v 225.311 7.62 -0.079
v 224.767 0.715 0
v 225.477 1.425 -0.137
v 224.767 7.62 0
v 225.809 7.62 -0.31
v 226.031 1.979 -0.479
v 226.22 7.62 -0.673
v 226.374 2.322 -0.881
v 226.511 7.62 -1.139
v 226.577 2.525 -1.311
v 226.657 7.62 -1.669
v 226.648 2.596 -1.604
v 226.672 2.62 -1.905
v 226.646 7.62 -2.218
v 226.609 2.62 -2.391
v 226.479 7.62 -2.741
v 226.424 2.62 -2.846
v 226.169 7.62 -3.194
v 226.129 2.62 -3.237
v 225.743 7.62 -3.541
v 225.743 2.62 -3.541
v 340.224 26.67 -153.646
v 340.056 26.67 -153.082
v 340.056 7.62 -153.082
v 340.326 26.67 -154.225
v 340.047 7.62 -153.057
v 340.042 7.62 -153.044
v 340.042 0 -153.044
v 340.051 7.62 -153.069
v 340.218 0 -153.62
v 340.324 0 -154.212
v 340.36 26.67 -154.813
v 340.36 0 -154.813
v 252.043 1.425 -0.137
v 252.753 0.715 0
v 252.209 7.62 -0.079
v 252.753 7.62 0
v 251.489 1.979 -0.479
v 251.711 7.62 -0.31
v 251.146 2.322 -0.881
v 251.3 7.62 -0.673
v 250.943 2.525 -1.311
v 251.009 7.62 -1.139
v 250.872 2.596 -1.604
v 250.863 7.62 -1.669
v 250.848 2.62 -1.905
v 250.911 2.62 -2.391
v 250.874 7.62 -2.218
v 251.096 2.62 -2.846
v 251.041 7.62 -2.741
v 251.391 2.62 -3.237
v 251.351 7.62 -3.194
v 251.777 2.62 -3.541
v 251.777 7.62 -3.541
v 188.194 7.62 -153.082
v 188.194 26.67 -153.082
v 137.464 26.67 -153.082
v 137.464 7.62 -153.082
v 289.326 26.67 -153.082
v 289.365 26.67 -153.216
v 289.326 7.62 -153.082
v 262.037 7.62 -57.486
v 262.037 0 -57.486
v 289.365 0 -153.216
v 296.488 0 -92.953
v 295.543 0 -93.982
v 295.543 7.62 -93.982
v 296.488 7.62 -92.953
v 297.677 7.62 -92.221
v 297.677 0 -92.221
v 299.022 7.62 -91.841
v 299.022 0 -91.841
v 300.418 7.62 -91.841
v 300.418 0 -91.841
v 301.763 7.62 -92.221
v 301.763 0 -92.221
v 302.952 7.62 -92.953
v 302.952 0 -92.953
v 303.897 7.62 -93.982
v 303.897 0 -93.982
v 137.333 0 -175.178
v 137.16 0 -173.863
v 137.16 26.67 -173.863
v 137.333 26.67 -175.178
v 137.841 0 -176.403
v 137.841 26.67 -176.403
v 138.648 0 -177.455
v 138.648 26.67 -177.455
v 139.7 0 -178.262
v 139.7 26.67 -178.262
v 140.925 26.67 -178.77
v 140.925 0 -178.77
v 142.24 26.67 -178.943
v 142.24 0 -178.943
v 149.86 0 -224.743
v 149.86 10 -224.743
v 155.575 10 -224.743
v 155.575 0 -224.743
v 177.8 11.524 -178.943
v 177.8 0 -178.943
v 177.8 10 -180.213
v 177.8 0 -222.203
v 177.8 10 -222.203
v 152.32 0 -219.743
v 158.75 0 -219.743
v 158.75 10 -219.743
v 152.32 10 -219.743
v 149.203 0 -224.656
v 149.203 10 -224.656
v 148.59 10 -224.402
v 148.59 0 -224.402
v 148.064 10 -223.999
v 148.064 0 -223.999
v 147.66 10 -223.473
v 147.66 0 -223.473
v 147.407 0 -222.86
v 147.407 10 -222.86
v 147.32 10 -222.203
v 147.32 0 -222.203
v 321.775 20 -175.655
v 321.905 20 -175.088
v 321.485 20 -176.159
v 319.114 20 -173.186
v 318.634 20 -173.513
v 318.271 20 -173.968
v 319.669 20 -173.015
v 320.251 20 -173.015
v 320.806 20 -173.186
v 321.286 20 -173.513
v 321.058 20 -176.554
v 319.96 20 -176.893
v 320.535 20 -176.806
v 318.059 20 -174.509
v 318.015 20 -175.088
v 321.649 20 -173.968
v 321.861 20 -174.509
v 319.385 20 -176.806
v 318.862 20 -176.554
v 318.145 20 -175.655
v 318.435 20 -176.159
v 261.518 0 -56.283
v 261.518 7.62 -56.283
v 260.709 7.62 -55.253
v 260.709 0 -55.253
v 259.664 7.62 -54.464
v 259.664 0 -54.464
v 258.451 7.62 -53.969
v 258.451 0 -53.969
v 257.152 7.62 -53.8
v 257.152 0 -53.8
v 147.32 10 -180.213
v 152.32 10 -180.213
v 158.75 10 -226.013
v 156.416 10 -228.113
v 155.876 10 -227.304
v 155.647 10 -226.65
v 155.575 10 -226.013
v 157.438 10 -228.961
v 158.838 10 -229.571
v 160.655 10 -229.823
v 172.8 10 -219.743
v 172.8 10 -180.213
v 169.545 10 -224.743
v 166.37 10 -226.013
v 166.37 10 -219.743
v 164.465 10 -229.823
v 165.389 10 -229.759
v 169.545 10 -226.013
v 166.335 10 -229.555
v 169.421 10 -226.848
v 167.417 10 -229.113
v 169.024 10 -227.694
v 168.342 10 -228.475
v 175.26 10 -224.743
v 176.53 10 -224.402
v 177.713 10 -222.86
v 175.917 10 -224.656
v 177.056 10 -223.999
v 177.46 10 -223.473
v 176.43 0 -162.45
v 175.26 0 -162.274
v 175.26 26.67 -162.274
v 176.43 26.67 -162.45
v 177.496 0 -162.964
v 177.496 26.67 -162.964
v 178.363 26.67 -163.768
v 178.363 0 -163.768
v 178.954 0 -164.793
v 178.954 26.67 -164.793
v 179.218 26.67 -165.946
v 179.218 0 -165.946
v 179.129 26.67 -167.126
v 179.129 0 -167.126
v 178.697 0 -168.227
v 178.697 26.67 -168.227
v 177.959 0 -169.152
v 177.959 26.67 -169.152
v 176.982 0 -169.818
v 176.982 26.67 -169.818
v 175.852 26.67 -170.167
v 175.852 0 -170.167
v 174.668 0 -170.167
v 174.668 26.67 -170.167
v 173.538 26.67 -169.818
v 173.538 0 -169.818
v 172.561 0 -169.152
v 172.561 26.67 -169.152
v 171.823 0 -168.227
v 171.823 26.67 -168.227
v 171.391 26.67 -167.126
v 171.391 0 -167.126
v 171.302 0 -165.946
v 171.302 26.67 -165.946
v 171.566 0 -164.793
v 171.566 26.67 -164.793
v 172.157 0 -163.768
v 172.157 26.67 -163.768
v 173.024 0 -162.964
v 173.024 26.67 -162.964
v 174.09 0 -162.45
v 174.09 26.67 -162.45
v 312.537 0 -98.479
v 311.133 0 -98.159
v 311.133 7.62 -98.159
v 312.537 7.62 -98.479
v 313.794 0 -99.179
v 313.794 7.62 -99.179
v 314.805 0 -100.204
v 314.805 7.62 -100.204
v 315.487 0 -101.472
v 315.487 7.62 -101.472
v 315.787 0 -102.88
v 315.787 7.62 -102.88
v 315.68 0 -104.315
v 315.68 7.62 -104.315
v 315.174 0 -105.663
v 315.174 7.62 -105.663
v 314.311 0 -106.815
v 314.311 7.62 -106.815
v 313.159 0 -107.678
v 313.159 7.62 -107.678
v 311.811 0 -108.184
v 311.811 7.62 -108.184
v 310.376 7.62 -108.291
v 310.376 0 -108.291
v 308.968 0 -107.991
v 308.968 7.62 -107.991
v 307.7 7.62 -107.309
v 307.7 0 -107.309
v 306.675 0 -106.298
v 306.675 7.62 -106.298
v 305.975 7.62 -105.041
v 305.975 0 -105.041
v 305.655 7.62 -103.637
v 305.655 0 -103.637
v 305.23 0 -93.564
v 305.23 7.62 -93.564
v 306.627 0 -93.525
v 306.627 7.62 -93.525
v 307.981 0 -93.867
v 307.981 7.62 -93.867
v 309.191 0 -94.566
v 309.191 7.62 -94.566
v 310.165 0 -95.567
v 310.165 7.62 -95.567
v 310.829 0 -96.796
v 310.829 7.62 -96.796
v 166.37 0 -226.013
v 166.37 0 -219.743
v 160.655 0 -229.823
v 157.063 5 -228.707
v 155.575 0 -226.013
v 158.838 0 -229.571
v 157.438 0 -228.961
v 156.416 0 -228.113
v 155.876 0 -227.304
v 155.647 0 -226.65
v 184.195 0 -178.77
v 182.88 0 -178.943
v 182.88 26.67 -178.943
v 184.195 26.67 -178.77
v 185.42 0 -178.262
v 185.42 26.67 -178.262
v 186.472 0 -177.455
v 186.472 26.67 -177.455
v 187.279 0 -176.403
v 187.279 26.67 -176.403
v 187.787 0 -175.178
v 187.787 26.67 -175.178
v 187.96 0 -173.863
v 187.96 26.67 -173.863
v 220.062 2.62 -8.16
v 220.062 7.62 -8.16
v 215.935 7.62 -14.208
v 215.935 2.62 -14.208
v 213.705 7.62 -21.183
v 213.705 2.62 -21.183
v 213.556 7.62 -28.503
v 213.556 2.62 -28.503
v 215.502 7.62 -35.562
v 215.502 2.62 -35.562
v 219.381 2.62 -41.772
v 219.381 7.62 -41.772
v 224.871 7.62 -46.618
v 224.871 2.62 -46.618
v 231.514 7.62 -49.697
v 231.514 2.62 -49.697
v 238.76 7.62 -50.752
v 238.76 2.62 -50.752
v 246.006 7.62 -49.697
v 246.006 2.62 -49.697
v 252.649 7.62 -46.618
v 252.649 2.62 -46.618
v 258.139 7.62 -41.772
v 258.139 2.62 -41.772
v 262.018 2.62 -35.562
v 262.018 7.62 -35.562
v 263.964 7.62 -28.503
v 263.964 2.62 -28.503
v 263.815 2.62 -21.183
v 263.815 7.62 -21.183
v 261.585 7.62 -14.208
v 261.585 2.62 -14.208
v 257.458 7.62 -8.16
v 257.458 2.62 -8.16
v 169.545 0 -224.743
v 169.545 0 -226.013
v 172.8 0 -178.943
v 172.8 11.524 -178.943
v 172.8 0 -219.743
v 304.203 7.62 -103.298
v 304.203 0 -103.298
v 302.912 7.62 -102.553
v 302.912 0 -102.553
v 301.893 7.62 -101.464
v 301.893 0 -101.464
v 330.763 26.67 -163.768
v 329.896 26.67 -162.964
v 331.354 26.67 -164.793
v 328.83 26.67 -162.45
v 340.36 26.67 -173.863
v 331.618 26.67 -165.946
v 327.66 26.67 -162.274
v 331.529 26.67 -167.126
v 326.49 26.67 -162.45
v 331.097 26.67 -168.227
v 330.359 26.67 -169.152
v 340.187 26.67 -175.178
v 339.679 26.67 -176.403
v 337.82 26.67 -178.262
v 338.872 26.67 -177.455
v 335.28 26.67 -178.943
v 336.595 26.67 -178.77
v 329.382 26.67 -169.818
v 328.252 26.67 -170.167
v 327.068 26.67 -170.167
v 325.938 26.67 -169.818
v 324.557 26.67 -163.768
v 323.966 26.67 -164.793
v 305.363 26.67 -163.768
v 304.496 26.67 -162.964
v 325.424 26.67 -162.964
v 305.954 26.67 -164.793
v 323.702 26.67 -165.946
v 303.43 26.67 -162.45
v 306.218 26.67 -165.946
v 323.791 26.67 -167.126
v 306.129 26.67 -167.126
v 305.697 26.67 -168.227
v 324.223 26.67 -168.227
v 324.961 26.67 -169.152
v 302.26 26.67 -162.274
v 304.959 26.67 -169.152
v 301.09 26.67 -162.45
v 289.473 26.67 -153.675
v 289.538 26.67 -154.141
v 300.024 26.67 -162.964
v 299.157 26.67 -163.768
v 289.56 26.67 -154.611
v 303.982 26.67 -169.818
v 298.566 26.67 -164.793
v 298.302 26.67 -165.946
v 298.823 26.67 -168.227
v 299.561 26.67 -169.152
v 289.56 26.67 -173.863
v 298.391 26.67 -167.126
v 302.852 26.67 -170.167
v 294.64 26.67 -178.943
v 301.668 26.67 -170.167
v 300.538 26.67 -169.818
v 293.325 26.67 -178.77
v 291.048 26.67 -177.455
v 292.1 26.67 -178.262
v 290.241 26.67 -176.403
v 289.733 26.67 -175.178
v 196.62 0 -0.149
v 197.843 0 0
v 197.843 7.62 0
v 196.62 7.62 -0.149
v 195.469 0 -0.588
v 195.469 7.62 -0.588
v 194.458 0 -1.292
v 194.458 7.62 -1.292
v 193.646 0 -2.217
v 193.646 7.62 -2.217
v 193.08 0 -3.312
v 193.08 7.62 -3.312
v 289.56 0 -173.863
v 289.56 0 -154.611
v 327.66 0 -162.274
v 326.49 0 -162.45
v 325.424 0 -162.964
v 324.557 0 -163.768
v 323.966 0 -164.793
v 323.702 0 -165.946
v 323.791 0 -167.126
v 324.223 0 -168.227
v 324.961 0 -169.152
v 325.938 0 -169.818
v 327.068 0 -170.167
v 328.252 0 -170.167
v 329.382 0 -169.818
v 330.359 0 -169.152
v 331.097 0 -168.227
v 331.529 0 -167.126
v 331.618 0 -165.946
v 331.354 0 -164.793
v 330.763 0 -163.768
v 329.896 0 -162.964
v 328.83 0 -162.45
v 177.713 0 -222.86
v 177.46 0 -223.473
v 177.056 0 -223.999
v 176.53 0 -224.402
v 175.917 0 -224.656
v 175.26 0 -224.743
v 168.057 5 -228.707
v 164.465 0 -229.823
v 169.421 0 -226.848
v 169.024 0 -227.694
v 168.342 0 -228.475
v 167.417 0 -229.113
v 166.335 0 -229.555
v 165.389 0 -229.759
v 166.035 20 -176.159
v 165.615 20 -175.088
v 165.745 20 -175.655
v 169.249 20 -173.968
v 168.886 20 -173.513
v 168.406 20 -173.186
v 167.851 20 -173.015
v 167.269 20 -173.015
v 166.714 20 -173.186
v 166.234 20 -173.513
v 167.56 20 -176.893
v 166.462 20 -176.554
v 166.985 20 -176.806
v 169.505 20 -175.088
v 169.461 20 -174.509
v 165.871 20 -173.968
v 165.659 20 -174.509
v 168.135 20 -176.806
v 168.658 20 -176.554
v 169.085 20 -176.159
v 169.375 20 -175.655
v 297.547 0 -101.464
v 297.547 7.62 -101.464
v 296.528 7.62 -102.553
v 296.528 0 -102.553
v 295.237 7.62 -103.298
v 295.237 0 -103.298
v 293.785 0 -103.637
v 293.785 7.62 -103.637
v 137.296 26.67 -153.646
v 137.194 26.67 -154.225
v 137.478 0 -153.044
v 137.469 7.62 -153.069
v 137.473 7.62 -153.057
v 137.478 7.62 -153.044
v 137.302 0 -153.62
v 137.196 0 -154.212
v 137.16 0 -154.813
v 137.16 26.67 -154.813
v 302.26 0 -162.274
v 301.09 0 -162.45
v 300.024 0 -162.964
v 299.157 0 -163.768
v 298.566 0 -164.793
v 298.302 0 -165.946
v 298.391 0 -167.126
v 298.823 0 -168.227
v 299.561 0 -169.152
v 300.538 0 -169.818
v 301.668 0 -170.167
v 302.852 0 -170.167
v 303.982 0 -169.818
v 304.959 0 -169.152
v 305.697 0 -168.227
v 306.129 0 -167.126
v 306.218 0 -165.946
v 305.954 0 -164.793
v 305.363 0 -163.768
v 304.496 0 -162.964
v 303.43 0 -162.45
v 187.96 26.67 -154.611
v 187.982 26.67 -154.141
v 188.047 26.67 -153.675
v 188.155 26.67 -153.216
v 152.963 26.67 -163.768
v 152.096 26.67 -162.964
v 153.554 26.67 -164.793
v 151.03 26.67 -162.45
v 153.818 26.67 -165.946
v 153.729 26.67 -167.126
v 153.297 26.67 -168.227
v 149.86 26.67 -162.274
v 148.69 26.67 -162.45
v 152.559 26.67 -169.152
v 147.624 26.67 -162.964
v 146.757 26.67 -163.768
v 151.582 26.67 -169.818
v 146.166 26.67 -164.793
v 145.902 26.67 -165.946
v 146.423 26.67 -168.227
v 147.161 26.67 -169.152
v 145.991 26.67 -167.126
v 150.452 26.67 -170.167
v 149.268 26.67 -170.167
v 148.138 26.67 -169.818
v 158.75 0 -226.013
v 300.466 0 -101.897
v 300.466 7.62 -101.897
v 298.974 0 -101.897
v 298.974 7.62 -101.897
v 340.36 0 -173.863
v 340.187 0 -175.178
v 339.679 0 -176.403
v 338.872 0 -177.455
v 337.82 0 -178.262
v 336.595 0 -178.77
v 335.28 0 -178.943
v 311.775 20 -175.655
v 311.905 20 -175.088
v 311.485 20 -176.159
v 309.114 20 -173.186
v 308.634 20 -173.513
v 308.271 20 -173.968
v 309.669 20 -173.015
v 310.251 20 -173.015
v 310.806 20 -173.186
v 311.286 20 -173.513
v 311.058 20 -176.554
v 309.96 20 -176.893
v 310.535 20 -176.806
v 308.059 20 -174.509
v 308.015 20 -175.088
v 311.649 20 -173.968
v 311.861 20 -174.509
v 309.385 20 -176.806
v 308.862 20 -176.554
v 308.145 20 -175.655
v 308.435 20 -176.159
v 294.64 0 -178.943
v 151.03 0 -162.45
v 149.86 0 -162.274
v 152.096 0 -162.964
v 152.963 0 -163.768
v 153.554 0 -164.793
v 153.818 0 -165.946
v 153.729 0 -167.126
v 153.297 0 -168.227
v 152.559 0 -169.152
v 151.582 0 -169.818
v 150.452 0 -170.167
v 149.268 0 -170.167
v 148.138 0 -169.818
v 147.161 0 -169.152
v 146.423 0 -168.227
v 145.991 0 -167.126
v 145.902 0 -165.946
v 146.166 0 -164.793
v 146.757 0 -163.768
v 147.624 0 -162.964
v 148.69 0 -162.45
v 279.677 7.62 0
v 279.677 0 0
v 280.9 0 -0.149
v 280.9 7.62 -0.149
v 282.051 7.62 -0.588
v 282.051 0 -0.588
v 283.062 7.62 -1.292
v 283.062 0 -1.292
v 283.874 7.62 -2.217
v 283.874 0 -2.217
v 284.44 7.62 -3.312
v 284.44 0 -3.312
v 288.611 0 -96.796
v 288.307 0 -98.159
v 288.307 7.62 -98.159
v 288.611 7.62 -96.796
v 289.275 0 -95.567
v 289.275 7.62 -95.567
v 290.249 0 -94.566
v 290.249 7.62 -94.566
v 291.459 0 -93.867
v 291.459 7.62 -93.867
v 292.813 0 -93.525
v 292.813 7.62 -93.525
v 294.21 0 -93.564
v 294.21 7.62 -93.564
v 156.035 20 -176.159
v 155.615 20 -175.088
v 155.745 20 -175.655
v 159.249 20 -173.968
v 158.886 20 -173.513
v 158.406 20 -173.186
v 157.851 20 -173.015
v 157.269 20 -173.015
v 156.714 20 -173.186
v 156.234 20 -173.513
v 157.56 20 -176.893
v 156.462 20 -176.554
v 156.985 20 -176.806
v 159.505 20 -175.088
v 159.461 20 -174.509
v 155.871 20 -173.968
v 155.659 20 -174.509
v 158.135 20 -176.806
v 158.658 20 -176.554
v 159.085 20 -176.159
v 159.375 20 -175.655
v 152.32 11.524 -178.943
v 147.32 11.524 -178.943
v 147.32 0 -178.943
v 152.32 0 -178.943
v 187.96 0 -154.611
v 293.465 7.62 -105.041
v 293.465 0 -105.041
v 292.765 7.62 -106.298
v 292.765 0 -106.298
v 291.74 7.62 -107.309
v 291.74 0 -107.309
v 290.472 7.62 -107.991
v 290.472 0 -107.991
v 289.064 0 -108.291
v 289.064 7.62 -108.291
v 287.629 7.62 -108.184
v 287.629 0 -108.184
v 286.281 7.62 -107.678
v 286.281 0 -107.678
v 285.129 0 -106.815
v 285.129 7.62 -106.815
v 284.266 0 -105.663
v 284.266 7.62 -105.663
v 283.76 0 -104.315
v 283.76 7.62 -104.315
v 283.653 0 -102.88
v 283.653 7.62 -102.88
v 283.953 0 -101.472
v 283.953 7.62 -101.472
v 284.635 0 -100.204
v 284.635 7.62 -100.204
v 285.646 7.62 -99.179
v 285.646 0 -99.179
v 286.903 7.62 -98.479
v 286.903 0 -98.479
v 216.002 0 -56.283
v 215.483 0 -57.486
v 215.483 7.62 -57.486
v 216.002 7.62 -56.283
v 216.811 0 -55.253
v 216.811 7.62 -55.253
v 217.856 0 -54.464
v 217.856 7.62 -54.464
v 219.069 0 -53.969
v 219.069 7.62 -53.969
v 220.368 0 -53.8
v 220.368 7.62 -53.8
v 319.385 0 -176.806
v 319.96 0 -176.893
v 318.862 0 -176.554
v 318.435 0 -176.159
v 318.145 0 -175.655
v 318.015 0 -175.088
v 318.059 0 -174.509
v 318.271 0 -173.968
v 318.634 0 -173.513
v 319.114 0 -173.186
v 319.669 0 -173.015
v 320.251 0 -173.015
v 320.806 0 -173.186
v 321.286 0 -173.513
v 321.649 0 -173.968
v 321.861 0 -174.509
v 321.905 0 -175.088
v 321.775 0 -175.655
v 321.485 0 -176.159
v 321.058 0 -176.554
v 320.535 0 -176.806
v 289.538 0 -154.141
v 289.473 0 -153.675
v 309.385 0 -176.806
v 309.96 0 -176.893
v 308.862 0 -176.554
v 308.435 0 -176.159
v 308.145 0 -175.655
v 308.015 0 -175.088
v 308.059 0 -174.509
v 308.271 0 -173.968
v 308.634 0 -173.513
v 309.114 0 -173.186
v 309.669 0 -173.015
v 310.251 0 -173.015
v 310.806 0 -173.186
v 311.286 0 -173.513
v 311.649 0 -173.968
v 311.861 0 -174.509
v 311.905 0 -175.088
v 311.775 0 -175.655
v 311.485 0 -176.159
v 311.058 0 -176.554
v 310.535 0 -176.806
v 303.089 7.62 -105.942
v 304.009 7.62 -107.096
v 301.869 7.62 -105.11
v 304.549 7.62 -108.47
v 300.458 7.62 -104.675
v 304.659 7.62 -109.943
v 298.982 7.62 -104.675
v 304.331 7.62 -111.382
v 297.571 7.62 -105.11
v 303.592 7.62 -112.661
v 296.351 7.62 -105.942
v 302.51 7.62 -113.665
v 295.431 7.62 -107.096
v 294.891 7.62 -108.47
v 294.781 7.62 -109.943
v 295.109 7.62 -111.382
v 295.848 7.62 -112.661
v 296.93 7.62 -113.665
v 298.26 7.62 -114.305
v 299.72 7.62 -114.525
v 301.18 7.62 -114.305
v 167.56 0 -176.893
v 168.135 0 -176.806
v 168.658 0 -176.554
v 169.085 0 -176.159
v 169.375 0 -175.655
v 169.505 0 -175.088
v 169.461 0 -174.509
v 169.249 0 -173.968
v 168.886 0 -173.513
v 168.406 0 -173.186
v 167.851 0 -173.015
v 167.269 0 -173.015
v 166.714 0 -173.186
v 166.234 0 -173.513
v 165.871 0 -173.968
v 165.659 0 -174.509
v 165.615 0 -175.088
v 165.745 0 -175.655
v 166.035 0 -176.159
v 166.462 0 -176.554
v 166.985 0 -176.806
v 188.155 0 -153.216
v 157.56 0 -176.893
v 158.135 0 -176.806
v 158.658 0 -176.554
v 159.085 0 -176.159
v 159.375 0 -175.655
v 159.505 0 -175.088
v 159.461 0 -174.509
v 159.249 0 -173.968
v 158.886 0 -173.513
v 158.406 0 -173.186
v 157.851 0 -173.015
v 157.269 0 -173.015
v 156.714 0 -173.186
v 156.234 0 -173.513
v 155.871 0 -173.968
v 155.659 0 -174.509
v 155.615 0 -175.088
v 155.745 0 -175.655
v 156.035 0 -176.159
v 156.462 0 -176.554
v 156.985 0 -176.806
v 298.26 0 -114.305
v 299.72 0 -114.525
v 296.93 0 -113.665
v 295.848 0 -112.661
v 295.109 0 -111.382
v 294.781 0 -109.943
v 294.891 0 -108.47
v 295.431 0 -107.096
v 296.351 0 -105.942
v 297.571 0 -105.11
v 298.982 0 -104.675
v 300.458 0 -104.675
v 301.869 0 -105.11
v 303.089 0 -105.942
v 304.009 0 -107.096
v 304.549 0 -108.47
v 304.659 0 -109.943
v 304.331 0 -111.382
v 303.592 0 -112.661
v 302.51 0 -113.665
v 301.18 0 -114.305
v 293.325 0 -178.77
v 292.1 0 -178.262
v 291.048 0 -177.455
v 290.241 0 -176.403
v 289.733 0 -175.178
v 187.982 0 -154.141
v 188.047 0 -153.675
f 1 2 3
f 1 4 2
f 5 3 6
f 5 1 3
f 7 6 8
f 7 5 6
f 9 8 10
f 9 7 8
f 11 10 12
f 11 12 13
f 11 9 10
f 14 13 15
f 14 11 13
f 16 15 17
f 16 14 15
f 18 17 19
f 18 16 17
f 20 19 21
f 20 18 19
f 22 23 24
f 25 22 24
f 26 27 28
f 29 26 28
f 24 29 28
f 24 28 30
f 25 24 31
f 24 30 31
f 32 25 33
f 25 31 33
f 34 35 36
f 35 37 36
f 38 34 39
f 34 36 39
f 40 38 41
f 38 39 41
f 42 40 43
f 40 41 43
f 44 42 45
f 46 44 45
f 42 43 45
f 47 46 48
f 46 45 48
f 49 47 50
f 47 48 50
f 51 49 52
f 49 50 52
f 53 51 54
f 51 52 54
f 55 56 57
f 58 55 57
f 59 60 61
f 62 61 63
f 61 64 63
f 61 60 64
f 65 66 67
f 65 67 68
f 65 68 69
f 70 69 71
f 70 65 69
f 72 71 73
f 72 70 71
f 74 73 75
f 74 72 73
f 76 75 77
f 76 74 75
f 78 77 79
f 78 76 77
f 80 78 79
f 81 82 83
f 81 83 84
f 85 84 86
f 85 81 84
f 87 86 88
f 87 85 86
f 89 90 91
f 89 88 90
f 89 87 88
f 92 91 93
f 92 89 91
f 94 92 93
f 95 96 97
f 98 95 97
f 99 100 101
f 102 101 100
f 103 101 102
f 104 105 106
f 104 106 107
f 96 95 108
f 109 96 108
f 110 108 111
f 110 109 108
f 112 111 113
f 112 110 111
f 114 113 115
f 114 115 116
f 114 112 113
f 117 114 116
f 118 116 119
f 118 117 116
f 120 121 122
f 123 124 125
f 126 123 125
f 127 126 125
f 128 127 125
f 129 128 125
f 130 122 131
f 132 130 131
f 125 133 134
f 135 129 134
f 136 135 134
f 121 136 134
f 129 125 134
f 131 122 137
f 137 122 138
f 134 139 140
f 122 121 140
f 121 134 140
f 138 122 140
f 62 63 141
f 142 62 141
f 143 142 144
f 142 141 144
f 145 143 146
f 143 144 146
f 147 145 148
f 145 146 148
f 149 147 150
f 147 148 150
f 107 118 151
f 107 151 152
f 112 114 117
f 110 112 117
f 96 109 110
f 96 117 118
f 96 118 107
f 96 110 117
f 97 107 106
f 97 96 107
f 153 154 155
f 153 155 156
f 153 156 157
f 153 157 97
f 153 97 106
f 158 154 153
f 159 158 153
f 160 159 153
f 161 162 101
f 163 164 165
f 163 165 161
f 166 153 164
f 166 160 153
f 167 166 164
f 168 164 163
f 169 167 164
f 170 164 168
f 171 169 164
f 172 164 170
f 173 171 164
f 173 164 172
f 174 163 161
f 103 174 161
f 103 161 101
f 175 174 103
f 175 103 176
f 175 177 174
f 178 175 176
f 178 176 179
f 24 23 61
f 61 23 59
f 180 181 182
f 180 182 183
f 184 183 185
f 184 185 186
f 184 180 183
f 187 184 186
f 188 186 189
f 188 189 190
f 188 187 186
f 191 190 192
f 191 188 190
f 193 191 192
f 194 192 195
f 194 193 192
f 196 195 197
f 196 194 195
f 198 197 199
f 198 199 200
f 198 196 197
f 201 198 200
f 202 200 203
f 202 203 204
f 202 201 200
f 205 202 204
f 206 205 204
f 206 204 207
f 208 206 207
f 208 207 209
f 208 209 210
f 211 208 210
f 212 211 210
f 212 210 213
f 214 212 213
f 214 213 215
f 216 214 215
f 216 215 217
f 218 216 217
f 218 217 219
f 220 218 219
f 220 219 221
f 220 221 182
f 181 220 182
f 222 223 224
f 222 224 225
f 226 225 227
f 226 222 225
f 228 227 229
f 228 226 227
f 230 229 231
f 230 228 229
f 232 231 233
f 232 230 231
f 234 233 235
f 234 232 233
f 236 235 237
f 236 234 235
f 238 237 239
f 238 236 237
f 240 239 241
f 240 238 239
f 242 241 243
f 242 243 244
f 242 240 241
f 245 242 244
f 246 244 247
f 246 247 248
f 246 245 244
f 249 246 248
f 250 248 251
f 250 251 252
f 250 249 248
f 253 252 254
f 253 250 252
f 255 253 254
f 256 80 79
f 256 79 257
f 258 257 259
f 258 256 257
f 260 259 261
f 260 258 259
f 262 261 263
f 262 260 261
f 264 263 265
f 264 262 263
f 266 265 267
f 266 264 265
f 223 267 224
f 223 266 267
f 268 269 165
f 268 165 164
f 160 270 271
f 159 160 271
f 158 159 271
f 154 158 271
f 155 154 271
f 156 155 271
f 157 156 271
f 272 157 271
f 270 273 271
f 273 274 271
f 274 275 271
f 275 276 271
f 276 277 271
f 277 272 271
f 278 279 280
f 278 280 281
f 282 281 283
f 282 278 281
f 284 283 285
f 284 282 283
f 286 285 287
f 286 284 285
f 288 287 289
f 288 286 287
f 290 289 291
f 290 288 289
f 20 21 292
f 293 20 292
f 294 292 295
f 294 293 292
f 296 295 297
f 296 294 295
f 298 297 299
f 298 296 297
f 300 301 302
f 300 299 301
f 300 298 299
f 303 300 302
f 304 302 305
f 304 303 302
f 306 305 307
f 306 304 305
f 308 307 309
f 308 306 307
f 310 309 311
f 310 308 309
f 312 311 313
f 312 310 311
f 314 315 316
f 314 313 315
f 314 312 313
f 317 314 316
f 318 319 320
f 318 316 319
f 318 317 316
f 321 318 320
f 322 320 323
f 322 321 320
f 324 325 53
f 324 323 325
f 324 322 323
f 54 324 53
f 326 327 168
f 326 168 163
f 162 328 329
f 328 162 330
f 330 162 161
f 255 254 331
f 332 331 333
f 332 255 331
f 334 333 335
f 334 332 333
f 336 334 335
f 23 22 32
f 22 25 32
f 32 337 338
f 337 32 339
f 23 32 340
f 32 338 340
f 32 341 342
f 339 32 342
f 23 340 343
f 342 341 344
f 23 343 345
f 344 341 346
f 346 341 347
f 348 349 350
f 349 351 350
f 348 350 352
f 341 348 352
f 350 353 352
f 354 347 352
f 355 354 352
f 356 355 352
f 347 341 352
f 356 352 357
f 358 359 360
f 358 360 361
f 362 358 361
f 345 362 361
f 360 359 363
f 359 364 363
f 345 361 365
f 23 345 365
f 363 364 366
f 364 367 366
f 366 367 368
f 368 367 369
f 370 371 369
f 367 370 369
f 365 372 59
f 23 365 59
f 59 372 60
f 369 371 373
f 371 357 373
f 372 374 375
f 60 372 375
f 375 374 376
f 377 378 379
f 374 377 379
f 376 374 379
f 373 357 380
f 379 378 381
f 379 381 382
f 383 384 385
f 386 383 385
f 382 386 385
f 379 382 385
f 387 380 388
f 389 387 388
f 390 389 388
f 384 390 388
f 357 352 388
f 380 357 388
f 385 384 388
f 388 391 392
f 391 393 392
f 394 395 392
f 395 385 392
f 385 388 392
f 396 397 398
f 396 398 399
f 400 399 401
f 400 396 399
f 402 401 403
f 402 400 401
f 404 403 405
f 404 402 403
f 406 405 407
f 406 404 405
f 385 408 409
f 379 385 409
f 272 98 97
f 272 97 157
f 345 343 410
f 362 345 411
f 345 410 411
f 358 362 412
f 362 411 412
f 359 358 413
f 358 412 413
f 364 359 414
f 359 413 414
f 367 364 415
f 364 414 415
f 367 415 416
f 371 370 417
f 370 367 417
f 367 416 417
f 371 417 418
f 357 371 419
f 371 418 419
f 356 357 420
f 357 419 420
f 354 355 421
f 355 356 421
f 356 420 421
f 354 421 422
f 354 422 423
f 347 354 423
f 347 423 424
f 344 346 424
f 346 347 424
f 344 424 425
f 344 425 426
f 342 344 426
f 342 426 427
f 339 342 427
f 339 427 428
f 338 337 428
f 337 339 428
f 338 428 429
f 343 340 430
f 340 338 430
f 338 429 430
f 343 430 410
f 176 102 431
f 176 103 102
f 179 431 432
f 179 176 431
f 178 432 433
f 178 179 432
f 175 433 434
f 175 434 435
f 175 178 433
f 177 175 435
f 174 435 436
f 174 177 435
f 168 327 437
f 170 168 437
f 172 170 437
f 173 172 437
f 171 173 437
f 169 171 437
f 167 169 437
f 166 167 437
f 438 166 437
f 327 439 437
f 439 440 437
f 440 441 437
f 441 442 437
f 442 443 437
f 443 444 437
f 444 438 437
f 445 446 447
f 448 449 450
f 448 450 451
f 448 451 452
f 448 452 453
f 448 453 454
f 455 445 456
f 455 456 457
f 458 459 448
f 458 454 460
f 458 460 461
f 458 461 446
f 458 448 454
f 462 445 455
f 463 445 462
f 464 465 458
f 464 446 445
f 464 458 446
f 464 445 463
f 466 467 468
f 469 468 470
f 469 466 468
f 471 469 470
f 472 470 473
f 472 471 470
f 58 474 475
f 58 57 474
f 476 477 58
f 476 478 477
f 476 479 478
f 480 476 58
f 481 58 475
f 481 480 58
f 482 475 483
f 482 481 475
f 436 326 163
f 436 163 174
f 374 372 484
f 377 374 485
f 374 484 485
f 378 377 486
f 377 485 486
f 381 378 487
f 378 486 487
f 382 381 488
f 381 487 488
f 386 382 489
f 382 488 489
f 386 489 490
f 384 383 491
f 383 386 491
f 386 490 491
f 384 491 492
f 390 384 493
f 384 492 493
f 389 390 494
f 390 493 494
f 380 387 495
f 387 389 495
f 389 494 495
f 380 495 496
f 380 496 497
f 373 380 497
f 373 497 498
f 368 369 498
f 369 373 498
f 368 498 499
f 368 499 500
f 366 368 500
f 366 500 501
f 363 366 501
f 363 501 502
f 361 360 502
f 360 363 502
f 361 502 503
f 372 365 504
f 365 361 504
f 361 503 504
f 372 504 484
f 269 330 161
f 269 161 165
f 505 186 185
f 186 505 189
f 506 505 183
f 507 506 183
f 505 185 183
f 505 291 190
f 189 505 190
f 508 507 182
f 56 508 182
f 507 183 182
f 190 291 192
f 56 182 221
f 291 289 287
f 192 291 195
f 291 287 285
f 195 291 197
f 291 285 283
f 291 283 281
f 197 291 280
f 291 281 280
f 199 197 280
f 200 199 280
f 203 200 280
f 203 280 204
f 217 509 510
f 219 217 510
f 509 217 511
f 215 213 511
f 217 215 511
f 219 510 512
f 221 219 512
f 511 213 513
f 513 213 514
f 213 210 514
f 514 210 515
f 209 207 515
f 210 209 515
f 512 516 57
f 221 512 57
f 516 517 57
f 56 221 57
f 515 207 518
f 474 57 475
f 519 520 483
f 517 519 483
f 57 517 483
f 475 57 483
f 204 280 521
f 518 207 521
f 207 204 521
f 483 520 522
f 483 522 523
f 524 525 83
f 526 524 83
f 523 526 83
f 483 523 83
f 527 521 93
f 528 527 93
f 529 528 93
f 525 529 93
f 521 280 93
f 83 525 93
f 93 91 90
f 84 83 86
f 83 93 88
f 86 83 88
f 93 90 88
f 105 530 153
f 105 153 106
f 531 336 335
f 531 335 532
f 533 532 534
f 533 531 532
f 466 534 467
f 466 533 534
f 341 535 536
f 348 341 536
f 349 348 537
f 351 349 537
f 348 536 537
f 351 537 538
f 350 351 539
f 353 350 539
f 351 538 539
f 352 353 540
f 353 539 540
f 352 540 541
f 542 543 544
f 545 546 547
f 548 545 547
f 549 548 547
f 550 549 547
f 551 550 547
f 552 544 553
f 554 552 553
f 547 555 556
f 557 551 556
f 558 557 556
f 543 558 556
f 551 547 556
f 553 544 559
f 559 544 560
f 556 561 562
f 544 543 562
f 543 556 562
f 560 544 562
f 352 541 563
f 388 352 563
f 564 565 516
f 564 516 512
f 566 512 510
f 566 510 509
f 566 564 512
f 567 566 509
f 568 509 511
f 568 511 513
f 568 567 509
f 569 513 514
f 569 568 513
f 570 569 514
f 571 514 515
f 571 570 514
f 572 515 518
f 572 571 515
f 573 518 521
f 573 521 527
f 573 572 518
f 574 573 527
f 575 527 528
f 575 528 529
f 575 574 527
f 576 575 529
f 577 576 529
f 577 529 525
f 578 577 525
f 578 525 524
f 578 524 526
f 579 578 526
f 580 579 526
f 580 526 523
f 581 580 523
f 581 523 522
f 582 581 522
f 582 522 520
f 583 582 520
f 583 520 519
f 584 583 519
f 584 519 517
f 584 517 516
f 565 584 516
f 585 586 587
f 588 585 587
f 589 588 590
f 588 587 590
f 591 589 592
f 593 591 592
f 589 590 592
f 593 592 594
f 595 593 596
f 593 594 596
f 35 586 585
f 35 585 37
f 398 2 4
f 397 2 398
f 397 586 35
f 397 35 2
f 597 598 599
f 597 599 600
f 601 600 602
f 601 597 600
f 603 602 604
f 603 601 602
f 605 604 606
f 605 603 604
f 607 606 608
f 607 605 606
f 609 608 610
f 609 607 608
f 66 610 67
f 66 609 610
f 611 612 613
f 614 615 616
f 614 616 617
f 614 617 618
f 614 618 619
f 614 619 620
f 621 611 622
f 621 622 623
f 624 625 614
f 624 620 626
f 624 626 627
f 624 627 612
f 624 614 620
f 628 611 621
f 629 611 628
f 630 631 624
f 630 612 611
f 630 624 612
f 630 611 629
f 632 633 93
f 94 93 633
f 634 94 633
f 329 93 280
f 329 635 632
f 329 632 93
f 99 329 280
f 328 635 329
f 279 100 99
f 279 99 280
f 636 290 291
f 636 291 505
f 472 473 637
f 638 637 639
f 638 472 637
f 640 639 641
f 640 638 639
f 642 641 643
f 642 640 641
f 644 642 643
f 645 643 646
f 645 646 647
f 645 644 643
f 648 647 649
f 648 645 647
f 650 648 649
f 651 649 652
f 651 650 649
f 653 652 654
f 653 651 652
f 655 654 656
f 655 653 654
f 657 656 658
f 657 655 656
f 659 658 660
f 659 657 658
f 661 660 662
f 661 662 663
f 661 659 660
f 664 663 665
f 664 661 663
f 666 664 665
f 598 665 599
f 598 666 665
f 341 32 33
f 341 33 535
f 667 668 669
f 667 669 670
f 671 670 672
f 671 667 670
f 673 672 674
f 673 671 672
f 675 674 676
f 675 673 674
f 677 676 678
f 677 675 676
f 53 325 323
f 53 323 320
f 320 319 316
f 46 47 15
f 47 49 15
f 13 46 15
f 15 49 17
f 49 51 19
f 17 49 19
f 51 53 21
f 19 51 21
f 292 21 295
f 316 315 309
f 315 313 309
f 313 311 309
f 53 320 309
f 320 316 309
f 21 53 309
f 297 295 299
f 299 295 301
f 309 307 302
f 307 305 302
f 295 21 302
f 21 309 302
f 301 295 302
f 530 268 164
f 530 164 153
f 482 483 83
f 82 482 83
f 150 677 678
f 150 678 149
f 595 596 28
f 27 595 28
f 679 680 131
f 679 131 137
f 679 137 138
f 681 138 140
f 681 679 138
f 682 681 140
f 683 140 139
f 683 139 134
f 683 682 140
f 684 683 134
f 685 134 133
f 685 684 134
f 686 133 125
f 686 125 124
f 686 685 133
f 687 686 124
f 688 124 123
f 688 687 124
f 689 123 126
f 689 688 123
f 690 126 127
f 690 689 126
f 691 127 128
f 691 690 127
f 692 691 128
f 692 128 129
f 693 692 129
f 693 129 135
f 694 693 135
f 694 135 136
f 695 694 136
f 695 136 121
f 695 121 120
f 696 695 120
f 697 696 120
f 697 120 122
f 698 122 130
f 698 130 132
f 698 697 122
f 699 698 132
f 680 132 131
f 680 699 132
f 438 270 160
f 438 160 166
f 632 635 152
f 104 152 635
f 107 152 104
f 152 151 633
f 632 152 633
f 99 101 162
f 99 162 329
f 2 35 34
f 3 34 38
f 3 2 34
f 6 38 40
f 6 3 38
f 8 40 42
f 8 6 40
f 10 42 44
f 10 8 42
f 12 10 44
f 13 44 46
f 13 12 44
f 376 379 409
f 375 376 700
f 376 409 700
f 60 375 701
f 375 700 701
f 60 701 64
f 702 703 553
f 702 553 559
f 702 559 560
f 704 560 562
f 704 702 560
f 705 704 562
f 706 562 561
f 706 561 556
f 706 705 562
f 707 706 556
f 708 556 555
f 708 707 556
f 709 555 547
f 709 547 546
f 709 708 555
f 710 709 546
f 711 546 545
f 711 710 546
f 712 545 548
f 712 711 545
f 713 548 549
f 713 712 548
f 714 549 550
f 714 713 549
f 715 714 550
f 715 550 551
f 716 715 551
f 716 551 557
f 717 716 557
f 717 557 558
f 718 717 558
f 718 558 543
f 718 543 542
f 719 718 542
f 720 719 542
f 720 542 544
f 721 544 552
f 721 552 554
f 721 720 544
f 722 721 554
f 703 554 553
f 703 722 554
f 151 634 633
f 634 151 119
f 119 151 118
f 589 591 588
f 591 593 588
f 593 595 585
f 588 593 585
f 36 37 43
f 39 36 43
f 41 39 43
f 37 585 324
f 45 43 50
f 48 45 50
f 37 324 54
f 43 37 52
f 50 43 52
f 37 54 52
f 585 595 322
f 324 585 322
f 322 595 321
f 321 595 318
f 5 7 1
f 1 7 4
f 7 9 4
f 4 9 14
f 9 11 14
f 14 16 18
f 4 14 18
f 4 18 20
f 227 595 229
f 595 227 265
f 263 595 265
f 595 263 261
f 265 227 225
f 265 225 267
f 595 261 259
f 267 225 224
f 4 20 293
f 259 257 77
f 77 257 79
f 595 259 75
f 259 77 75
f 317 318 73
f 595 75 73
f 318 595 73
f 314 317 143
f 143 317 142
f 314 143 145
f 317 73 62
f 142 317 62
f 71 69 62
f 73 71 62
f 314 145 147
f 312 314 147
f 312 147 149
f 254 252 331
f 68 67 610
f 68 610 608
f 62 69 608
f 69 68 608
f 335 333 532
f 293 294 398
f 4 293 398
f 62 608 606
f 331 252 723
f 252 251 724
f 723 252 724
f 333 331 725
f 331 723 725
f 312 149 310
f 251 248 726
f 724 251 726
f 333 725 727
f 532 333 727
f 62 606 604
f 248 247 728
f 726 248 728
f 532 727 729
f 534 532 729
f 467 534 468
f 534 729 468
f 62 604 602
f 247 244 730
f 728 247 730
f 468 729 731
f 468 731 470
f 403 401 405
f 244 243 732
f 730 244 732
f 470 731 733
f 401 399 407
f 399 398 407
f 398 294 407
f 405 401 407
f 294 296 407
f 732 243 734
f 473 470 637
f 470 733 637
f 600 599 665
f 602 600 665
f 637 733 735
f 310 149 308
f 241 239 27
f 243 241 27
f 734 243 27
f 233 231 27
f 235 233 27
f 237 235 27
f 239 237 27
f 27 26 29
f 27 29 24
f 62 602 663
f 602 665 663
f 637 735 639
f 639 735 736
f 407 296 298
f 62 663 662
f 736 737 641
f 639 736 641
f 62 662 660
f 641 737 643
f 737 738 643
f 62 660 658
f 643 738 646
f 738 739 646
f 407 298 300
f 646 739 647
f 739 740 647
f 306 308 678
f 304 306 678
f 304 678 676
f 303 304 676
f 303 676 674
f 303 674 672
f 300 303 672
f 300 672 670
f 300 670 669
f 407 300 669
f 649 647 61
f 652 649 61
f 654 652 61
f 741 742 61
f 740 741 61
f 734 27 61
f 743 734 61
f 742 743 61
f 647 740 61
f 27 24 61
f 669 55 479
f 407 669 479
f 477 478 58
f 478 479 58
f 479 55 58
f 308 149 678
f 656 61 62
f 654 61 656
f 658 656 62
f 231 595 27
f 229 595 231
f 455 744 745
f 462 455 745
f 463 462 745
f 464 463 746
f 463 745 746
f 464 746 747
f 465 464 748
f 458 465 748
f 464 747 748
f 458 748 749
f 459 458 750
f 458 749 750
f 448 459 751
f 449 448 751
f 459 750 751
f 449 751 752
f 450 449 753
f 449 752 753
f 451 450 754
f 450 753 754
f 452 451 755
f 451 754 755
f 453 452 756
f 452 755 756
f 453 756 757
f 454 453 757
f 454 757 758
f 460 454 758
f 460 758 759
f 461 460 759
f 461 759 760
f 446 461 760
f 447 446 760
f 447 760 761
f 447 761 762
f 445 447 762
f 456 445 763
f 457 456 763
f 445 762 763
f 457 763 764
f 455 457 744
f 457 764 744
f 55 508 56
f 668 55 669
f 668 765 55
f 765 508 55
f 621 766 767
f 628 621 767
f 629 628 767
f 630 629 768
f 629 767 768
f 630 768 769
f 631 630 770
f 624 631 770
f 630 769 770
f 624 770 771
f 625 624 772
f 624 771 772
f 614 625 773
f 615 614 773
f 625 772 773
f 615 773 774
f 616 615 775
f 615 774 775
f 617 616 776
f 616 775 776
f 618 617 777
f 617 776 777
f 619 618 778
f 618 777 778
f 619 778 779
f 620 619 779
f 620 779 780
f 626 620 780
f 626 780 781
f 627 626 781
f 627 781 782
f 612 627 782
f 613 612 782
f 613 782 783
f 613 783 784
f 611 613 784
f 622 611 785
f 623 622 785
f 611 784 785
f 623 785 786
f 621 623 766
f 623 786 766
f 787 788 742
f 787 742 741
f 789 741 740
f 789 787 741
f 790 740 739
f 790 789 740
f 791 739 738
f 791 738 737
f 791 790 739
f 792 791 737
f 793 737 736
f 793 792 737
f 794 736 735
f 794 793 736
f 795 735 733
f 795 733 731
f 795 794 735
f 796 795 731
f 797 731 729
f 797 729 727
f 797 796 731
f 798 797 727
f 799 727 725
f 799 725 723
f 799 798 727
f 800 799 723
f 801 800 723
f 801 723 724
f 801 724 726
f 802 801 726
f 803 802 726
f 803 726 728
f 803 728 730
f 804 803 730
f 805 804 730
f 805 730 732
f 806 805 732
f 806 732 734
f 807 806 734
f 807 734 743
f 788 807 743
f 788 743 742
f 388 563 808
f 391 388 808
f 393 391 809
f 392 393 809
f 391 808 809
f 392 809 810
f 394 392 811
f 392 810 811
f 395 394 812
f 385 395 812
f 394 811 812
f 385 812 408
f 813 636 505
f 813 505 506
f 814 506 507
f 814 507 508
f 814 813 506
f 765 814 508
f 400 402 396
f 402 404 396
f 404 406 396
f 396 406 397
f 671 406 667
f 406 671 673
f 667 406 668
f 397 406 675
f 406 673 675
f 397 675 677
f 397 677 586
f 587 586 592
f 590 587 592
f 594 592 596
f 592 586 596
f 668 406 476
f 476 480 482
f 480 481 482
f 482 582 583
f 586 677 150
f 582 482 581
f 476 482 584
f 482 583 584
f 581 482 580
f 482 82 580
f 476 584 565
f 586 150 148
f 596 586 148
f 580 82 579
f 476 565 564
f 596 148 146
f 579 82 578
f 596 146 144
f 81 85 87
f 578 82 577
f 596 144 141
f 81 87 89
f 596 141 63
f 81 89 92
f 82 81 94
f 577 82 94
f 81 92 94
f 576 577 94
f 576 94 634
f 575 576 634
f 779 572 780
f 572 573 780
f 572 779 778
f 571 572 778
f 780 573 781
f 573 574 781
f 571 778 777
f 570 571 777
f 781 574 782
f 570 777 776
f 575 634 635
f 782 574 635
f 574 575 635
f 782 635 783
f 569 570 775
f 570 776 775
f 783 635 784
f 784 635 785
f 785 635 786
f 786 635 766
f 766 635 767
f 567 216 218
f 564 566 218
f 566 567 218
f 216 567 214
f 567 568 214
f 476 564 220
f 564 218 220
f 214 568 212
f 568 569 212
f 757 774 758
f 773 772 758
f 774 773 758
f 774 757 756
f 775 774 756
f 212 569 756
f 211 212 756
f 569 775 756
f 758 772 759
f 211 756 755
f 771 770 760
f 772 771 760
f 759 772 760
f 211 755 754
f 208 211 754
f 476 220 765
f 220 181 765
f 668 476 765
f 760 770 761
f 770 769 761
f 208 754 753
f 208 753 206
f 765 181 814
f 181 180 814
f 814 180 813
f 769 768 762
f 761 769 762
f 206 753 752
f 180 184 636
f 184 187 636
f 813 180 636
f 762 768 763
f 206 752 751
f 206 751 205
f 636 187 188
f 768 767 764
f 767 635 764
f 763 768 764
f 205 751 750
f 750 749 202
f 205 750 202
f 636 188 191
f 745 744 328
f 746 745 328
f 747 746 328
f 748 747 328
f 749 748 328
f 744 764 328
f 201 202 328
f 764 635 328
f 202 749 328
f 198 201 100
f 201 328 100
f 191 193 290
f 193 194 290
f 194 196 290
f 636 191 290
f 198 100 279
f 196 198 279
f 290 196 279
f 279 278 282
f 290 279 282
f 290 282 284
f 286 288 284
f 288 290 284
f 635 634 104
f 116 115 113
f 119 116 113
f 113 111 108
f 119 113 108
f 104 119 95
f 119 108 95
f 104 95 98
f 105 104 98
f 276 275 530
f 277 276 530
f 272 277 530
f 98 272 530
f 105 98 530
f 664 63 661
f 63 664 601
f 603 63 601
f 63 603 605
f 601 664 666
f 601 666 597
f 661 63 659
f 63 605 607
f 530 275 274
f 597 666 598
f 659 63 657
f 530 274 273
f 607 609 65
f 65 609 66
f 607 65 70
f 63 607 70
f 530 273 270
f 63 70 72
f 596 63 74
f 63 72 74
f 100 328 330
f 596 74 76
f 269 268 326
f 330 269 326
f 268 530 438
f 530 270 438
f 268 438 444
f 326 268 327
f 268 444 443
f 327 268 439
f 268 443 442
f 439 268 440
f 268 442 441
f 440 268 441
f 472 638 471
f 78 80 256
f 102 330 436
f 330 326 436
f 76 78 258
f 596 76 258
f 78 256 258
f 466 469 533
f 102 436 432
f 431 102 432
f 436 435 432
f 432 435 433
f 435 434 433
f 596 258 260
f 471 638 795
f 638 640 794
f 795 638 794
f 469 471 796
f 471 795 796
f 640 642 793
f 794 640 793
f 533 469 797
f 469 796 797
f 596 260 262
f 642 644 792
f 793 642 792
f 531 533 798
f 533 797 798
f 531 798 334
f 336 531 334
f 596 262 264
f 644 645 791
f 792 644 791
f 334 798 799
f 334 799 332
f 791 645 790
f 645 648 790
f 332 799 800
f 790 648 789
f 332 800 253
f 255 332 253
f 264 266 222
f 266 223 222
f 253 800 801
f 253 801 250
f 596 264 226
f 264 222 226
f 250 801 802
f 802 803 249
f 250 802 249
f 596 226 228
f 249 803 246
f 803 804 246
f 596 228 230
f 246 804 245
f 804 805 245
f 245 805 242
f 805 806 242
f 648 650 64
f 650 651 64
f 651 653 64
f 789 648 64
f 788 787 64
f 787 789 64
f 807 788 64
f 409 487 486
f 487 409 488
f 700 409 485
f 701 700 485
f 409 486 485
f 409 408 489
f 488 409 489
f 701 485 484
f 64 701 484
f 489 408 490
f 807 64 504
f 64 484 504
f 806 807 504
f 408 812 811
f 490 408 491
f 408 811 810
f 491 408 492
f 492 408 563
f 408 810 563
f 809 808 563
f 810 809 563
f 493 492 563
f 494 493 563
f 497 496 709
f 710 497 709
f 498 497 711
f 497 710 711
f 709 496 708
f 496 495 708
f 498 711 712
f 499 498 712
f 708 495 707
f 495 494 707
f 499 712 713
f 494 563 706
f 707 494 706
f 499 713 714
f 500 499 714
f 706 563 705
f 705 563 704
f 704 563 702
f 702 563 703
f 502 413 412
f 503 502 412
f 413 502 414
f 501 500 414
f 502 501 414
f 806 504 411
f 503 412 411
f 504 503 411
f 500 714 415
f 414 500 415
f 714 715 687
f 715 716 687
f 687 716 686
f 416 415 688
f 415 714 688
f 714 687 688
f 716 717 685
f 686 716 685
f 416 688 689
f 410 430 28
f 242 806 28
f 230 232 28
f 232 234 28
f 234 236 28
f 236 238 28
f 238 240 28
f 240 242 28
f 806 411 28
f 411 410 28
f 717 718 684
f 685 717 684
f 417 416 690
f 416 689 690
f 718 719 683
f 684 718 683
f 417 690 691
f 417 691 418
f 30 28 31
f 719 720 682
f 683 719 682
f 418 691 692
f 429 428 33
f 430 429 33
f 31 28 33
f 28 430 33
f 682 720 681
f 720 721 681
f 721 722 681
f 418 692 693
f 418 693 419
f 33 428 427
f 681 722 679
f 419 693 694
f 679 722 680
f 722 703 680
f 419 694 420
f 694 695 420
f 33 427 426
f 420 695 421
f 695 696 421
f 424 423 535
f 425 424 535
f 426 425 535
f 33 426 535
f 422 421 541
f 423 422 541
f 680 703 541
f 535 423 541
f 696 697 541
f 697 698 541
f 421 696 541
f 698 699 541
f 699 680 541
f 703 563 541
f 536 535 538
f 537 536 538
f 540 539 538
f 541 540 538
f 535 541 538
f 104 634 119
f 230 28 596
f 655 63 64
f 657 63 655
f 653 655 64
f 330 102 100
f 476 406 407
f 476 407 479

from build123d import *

# Parameters (mm, degrees)
SKETCH1_R            = 3.96875
BOSS_EXTRUDE2_DEPTH  = 40.64
SKETCH7_W            = 321.437634852
SKETCH7_H            = 153.081921076
CUT_EXTRUDE3_DEPTH   = 33.02
EXTRUDE_THIN1_DEPTH  = 10
SKETCH14_R           = 1.950000064
CUT_EXTRUDE6_DEPTH   = 20
BOSS_EXTRUDE4_DEPTH  = 5
MIRROR5_COPY_1_DEPTH = 5
FILLET3_R            = 2.54
SKETCH20_W           = 13.97
SKETCH20_H           = 5.08
BOSS_EXTRUDE5_DEPTH  = 10
FILLET7_SIZE         = 3.81
FILLET7_SIZE_2       = 5.08
FILLET6_SIZE         = 3.81
FILLET6_SIZE_2       = 5.08
CUT_EXTRUDE10_START  = -5
SKETCH19_W           = 7.62
SKETCH19_H           = 10.16
CUT_EXTRUDE10_DEPTH  = 6.27
MIRROR6_OUTLINE_W    = 7.62
MIRROR6_OUTLINE_H    = 5
MIRROR6_DEPTH        = 10
MIRROR6_2_DEPTH      = 10
SKETCH21_W           = 77.087164644
SKETCH21_H           = 69.073945867
CUT_EXTRUDE11_DEPTH  = 210.74909516
SKETCH23_R           = 5.08
CUT_EXTRUDE12_DEPTH  = 255.54404949
SKETCH22_R           = 4.953
CUT_EXTRUDE13_DEPTH  = 255.54404949
CUT_EXTRUDE14_START  = 19.05
SKETCH24_W           = 240.575030827
SKETCH24_H           = 80.300707095
CUT_EXTRUDE14_DEPTH  = 235.389112867
SKETCH25_R           = 25.4
CUT_EXTRUDE15_DEPTH  = 5
FILLET10_R           = 1.905


# Read off the part's stored shape, not the designer's step: Mirror6
with BuildPart() as part:
    # Sketch1 → Boss-Extrude2 (new body)
    with BuildSketch(Plane(origin=(0, 0, 0), x_dir=(1, 0, 0), z_dir=(0, 1, 0))):
        with BuildLine():
            Line((-96.52, 178.942765331), (-55.88, 178.942765331))
            ThreePointArc((-55.88, 178.942765331), (-52.287897552, 177.454867779), (-50.8, 173.862765331))
            Line((-50.8, 173.862765331), (-50.8, 154.610881096))
            ThreePointArc((-50.8, 154.610881096), (-50.750979429, 153.906859803), (-50.604863787, 153.216425724))
            Line((-50.604863787, 153.216425724), (-23.277092285, 57.485544628))
            ThreePointArc((-23.277092285, 57.485544628), (-21.451849938, 54.824742099), (-18.392228498, 53.8))
            Line((-18.392228498, 53.8), (0, 53.8))
            Line((0, 53.8), (0, 0))
            Line((0, 0), (-40.91748188, 0))
            ThreePointArc((-40.91748188, 0), (-43.817717665, 0.909264766), (-45.679732106, 3.31156205))
            Line((-45.679732106, 3.31156205), (-101.282250226, 153.044327381))
            ThreePointArc((-101.282250226, 153.044327381), (-101.519931557, 153.914386555), (-101.6, 154.812765331))
            Line((-101.6, 154.812765331), (-101.6, 173.862765331))
            ThreePointArc((-101.6, 173.862765331), (-100.112102448, 177.454867779), (-96.52, 178.942765331))
        make_face()
        with Locations(Location((-88.9, 166.242765331, 0), (0, 0, 270))):
            Circle(SKETCH1_R, mode=Mode.SUBTRACT)
        with Locations(Location((-63.5, 166.242765331, 0), (0, 0, 270))):
            Circle(SKETCH1_R, mode=Mode.SUBTRACT)
    boss_extrude2 = extrude(amount=BOSS_EXTRUDE2_DEPTH)

    # Mirror1: Boss-Extrude2 across plane
    add(boss_extrude2.mirror(Plane(origin=(0, 40.64, -53.8), x_dir=(0, 0, 1), z_dir=(-1, 0, 0))))

    # Sketch7 → Cut-Extrude3 (cut)
    with BuildSketch(Plane(origin=(0, 40.64, 0), x_dir=(1, 0, 0), z_dir=(0, 1, 0))):
        with Locations((5.589227859, 76.540960538)):
            Rectangle(SKETCH7_W, SKETCH7_H)
    extrude(amount=-CUT_EXTRUDE3_DEPTH, mode=Mode.SUBTRACT)

    # Sketch9 → Extrude-Thin1 (add)
    with BuildSketch(Plane(origin=(0, 0, 0), x_dir=(1, 0, 0), z_dir=(0, 1, 0))):
        Polygon((-91.44, 173.942765331), (-91.44, 224.742765331), (-60.96, 224.742765331), (-60.96, 173.942765331), (-65.96, 173.942765331), (-65.96, 219.742765331), (-86.44, 219.742765331), (-86.44, 173.942765331), align=None)
    extrude_thin1 = extrude(amount=EXTRUDE_THIN1_DEPTH)

    # Sketch14 → Cut-Extrude6 (cut)
    with BuildSketch(Plane.XZ):
        with Locations(Location((-81.2, -174.942765331, 0), (0, 0, 270))):
            Circle(SKETCH14_R)
        with Locations(Location((-71.2, -174.942765331, 0), (0, 0, 270))):
            Circle(SKETCH14_R)
    cut_extrude6 = extrude(amount=-CUT_EXTRUDE6_DEPTH, mode=Mode.SUBTRACT)

    # Sketch18 → Boss-Extrude4 (add)
    with BuildSketch(Plane(origin=(-60.96, 10, -178.942765331), x_dir=(0, 0, 1), z_dir=(-1, 0, 0))):
        Polygon((-1.27, 0), (0, 1.524), (0, 0), align=None)
    boss_extrude4 = extrude(amount=BOSS_EXTRUDE4_DEPTH)

    # Mirror3: Boss-Extrude4 across plane
    add(boss_extrude4.mirror(Plane(origin=(-76.2, 0, 0), x_dir=(0, 0, 1), z_dir=(1, 0, 0))))

    # Mirror5: Extrude-Thin1, Cut-Extrude6, Boss-Extrude4 across plane
    add(extrude_thin1.mirror(Plane(origin=(0, 0, 0), x_dir=(0, 0, 1), z_dir=(1, 0, 0))))
    add(cut_extrude6.mirror(Plane(origin=(0, 0, 0), x_dir=(0, 0, 1), z_dir=(1, 0, 0))), mode=Mode.SUBTRACT)
    add(boss_extrude4.mirror(Plane(origin=(0, 0, 0), x_dir=(0, 0, 1), z_dir=(1, 0, 0))))

    # Mirror5 copy 1 sketch → Mirror5 copy 1 (add)
    with BuildSketch(Plane(origin=(91.44, 10, -178.942765331), x_dir=(0, 0, 1), z_dir=(-1, 0, 0))):
        Polygon((-1.27, 0), (0, 1.524), (0, 0), align=None)
    extrude(amount=MIRROR5_COPY_1_DEPTH)

    # Fillet3
    fillet3_edges = [part.edges().sort_by_distance(p)[0] for p in [
        (-91.44, 5, -224.742765331),
        (-60.96, 5, -224.742765331),
        (91.44, 5, -224.742765331),
        (60.96, 5, -224.742765331),
    ]]
    fillet(fillet3_edges, radius=FILLET3_R)

    # Sketch20 → Boss-Extrude5 (add)
    with BuildSketch(Plane(origin=(0, 0, 0), x_dir=(1, 0, 0), z_dir=(0, 1, 0))):
        with Locations((-76.2, 227.282765331)):
            Rectangle(SKETCH20_W, SKETCH20_H)
    extrude(amount=BOSS_EXTRUDE5_DEPTH)

    # Fillet7
    # an asymmetric fillet: 5.08, 3.81 mm, written as the material it takes off along each edge
    with BuildSketch(Plane(origin=(-83.185, -12.7, -229.822765331), x_dir=(0, 0, 1), z_dir=(0, 1, 0))) as fillet7_piece_1:
        with BuildLine():
            Bezier((FILLET7_SIZE, 0), (0, 0), (0, FILLET7_SIZE_2), weights=[1, 0.707106781, 1])
            Line((0, FILLET7_SIZE_2), (0, 0))
            Line((0, 0), (FILLET7_SIZE, 0))
        make_face()
    extrude(amount=35.4, mode=Mode.SUBTRACT)

    # Fillet6
    # an asymmetric fillet: 5.08, 3.81 mm, written as the material it takes off along each edge
    with BuildSketch(Plane(origin=(-69.215, -12.7, -229.822765331), x_dir=(0, 0, 1), z_dir=(0, 1, 0))) as fillet6_piece_1:
        with BuildLine():
            Bezier((FILLET6_SIZE, 0), (0, 0), (0, -FILLET6_SIZE_2), weights=[1, 0.707106781, 1])
            Line((0, -FILLET6_SIZE_2), (0, 0))
            Line((0, 0), (FILLET6_SIZE, 0))
        make_face()
    extrude(amount=35.4, mode=Mode.SUBTRACT)

    # Sketch19 → Cut-Extrude10 (cut)
    with BuildSketch(Plane(origin=(0, 0, -224.742765331), x_dir=(-1, 0, 0), z_dir=(0, 0, -1)).offset(CUT_EXTRUDE10_START)):
        with Locations((76.2, 4.92)):
            Rectangle(SKETCH19_W, SKETCH19_H)
    extrude(amount=CUT_EXTRUDE10_DEPTH, mode=Mode.SUBTRACT)

    # Mirror6 outline → Mirror6 (cut)
    with BuildSketch(Plane(origin=(0, 0, 0), x_dir=(1, 0, 0), z_dir=(0, 1, 0))):
        with Locations((76.2, 222.242765331)):
            Rectangle(MIRROR6_OUTLINE_W, MIRROR6_OUTLINE_H)
    extrude(amount=MIRROR6_DEPTH, mode=Mode.SUBTRACT)

    # Mirror6 2 outline → Mirror6 2 (add)
    with BuildSketch(Plane(origin=(0, 0, 0), x_dir=(1, 0, 0), z_dir=(0, 1, 0))):
        with BuildLine():
            add(Edge.make_bspline(
                [(78.105, 229.822765331), (83.185, 229.822765331), (83.185, 226.012765331)],
                knots=[0, 0, 0, 1, 1, 1], degree=2, weights=[1, 0.707106781, 1]))
            Line((78.105, 229.822765331), (74.295, 229.822765331))
            add(Edge.make_bspline(
                [(69.215, 226.012765331), (69.215, 229.822765331), (74.295, 229.822765331)],
                knots=[0, 0, 0, 1, 1, 1], degree=2, weights=[1, 0.707106781, 1]))
            Line((69.215, 226.012765331), (69.215, 224.742765331))
            Line((69.215, 224.742765331), (72.39, 224.742765331))
            Line((72.39, 224.742765331), (72.39, 226.012765331))
            Line((72.39, 226.012765331), (80.01, 226.012765331))
            Line((80.01, 226.012765331), (80.01, 224.742765331))
            Line((80.01, 224.742765331), (83.185, 224.742765331))
            Line((83.185, 224.742765331), (83.185, 226.012765331))
        make_face()
    extrude(amount=MIRROR6_2_DEPTH)

    # Sketch21 → Cut-Extrude11 (cut, through all)
    with BuildSketch(Plane(origin=(0, 0, -178.942765331), x_dir=(-1, 0, 0), z_dir=(0, 0, -1))):
        with Locations((78.752430528, 22.788762469)):
            Rectangle(SKETCH21_W, SKETCH21_H)
    extrude(amount=CUT_EXTRUDE11_DEPTH, mode=Mode.SUBTRACT)

    # Sketch23 → Cut-Extrude12 (cut, through all)
    with BuildSketch(Plane.XZ):
        with Locations((-67.31, -98.573931837)):
            Circle(SKETCH23_R)
        with Locations((-71.958522628, -103.222454465)):
            Circle(SKETCH23_R)
        with Locations((-60.96, -96.872454465)):
            Circle(SKETCH23_R)
        with Locations((-54.61, -98.573931837)):
            Circle(SKETCH23_R)
        with Locations((-49.961477372, -103.222454465)):
            Circle(SKETCH23_R)
    extrude(amount=-CUT_EXTRUDE12_DEPTH, mode=Mode.SUBTRACT)

    # Sketch22 → Cut-Extrude13 (cut, through all)
    with BuildSketch(Plane.XZ):
        with Locations(Location((-60.96, -109.572454465, 0), (0, 0, 270))):
            Circle(SKETCH22_R)
    extrude(amount=-CUT_EXTRUDE13_DEPTH, mode=Mode.SUBTRACT)

    # Sketch24 → Cut-Extrude14 (cut, through all)
    with BuildSketch(Plane(origin=(0, 7.62, 0), x_dir=(1, 0, 0), z_dir=(0, 1, 0)).offset(CUT_EXTRUDE14_START)):
        with Locations((-12.016343346, 155.193868331)):
            Rectangle(SKETCH24_W, SKETCH24_H)
    extrude(amount=CUT_EXTRUDE14_DEPTH, mode=Mode.SUBTRACT)

    # Sketch25 → Cut-Extrude15 (cut)
    with BuildSketch(Plane(origin=(0, 7.62, 0), x_dir=(1, 0, 0), z_dir=(0, 1, 0))):
        with Locations((0, 25.352)):
            Circle(SKETCH25_R)
    extrude(amount=-CUT_EXTRUDE15_DEPTH, mode=Mode.SUBTRACT)

    # Fillet10
    fillet10_edges = [part.edges().sort_by_distance(p)[0] for p in [
        (0, 2.62, 0),
        (-1.560799795, 5.12, 0),
        (1.560799795, 5.12, 0),
    ]]
    fillet(fillet10_edges, radius=FILLET10_R)


with BuildPart() as body_2:
    # Mirror16: mirrored copy
    add(part.part.mirror(Plane(origin=(119.38, 0, 0), x_dir=(0, 0, 1), z_dir=(1, 0, 0))))


solid = body_2.part
